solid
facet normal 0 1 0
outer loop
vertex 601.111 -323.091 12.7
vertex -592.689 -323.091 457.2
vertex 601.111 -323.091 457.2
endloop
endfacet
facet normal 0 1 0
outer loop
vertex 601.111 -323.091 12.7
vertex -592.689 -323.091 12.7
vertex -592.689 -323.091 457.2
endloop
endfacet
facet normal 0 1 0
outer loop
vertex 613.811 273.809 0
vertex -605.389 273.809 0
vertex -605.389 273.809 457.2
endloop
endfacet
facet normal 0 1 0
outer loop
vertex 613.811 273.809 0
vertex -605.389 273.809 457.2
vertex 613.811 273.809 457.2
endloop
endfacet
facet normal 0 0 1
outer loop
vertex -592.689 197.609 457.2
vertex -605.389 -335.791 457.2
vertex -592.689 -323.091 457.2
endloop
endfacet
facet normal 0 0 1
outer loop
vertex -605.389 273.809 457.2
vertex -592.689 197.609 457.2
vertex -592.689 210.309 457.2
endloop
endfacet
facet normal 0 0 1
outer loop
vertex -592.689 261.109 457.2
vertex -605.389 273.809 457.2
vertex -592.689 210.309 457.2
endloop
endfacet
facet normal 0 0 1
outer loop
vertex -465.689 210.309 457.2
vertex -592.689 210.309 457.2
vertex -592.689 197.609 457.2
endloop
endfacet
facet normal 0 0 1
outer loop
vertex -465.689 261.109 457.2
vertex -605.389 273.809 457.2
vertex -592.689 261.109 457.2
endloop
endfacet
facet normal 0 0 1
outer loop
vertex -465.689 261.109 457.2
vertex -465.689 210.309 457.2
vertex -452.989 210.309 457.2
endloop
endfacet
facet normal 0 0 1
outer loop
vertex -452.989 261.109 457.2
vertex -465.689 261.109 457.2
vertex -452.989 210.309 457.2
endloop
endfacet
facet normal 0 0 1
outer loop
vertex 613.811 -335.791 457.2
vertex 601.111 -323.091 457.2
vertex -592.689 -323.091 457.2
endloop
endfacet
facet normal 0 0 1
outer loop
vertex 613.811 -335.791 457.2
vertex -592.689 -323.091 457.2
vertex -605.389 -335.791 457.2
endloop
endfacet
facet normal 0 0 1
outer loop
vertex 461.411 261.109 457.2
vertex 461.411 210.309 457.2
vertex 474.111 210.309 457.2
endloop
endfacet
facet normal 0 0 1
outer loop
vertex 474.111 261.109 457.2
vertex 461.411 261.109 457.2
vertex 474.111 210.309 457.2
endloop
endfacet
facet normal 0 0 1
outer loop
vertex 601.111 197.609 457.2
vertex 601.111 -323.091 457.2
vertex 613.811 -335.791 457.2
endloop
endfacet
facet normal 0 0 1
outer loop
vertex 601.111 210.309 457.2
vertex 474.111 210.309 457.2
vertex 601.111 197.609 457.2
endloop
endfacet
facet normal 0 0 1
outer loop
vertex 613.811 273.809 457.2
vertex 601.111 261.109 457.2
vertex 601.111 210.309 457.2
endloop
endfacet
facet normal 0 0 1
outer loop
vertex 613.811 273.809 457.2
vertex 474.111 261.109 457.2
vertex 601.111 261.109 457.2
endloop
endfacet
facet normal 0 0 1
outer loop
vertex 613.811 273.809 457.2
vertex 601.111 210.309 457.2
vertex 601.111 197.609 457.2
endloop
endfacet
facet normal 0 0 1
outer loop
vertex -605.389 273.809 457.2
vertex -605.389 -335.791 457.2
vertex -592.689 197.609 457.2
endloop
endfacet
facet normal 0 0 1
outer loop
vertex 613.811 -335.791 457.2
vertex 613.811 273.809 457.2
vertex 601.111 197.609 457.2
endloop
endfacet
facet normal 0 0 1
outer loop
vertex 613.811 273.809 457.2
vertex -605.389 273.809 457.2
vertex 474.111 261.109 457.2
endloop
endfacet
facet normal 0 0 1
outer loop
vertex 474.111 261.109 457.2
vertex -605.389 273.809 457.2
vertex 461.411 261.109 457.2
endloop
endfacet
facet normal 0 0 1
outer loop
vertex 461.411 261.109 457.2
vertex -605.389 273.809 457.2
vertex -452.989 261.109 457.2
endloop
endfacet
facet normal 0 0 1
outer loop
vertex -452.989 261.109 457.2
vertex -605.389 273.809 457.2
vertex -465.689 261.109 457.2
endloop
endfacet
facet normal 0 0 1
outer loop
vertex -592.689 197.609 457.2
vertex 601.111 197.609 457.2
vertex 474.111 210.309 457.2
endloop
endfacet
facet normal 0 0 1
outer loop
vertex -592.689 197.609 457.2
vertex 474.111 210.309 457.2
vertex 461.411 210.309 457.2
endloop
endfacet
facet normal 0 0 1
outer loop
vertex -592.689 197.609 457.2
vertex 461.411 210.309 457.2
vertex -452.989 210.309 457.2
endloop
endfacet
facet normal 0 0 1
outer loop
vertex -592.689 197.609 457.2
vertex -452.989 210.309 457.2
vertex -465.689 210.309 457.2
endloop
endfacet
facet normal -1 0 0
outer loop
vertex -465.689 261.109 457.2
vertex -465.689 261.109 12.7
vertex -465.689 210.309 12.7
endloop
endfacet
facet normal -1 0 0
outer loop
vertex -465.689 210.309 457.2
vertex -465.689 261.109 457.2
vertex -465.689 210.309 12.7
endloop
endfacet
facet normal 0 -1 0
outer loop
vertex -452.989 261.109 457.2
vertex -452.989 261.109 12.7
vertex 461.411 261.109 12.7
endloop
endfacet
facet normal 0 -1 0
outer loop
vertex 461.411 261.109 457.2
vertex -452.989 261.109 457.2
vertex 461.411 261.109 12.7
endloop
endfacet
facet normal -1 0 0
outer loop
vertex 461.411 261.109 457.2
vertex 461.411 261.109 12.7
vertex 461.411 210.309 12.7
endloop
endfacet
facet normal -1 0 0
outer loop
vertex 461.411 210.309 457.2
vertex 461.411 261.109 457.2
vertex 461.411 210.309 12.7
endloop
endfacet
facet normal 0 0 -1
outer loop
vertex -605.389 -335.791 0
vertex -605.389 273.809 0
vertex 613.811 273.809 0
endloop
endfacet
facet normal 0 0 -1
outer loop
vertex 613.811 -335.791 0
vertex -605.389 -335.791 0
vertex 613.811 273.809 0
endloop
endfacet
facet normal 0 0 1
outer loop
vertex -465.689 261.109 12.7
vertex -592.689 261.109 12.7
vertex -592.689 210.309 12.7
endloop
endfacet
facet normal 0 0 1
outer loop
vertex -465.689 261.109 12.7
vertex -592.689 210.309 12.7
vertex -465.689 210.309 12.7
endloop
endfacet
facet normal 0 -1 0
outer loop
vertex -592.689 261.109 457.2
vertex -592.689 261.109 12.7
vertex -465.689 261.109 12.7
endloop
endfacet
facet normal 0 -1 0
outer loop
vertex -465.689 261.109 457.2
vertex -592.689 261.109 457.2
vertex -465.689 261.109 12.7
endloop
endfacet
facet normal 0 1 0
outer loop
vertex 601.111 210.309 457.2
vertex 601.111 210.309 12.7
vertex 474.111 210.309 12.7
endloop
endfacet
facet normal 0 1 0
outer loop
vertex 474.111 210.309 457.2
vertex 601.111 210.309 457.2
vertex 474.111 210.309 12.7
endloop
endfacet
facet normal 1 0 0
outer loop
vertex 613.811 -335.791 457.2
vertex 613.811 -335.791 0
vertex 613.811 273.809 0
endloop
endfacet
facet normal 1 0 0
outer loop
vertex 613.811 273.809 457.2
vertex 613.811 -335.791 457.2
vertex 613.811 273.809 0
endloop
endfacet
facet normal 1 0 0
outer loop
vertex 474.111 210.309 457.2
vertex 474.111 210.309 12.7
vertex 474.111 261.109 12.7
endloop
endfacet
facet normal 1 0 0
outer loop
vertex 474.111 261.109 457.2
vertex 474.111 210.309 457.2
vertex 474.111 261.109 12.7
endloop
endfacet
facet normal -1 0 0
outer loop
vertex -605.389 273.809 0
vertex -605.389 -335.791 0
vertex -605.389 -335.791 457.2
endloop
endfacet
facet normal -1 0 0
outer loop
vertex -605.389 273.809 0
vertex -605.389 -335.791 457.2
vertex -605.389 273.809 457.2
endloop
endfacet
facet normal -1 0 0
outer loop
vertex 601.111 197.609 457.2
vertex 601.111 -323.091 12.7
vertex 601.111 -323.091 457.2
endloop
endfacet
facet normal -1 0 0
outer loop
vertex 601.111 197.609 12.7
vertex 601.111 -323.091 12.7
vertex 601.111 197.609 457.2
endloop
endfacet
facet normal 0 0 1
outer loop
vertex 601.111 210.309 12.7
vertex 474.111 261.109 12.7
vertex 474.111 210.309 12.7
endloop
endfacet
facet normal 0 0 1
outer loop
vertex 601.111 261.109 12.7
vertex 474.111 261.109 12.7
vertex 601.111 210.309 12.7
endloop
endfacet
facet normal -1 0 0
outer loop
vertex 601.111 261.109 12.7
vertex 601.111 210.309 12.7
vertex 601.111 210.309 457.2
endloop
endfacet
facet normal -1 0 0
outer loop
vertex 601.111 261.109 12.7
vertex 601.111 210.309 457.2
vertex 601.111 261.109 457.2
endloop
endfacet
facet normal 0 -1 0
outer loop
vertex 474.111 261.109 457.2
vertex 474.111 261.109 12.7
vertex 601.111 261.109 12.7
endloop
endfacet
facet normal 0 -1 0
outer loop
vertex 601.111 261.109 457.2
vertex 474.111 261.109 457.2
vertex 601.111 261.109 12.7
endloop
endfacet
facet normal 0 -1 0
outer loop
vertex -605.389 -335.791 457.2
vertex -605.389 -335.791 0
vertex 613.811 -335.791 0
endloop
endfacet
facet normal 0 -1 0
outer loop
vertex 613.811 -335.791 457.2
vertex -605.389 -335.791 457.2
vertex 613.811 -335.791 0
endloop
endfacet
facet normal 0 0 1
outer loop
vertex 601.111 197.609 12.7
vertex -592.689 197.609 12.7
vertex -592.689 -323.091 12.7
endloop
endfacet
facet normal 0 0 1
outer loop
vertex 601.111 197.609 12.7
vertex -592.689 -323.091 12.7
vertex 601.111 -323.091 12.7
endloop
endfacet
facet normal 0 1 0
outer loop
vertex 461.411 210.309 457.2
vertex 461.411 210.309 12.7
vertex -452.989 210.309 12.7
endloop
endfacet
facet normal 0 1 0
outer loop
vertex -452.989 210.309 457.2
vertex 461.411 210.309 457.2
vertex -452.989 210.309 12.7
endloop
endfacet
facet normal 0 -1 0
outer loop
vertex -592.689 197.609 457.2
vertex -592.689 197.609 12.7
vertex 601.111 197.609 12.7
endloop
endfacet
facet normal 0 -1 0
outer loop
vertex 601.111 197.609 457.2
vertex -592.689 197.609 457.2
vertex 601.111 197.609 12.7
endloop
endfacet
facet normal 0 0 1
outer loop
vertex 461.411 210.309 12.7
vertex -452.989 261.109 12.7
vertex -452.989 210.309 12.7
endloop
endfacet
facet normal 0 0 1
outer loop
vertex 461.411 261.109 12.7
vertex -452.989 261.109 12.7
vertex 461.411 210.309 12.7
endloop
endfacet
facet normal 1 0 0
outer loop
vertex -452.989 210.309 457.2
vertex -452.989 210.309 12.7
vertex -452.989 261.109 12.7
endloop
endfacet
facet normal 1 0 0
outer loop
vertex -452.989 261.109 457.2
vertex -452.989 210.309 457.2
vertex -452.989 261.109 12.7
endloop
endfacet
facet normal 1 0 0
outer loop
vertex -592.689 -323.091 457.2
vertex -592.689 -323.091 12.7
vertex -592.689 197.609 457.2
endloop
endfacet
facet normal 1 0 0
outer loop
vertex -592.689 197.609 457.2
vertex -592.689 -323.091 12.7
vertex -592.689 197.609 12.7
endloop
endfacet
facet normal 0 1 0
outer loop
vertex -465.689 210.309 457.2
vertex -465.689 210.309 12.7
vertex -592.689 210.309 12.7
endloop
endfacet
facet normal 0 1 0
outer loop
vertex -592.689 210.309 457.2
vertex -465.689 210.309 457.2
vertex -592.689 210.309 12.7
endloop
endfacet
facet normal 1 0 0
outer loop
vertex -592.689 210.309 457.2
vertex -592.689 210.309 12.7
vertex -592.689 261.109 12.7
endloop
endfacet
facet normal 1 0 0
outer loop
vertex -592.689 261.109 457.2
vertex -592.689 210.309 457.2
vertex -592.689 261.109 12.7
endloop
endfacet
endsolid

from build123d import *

# Parameters (mm, degrees)
F0_W     = 1219.2
F0_H     = 609.6
F1_DEPTH = 457.2
F2_T     = -12.7
F4_DEPTH = 444.5


with BuildPart() as f1:
    # F0 (on Top) → F1 (new body)
    with BuildSketch(Plane.XY):
        with Locations((4.2110532522, -30.9912272245)):
            Rectangle(F0_W, F0_H)
    extrude(amount=F1_DEPTH)

    # F2
    f2_openings = [f1.faces().sort_by_distance(p)[0] for p in [
        (4.211053, -30.991227, 457.2),
    ]]
    offset(amount=F2_T, openings=f2_openings)

    # F3 (on face) → F4 (join, through all)
    with BuildSketch(Plane.XY.offset(12.7)):
        Polygon((-465.6889467478, 210.3087727755), (-592.6889467478, 210.3087727755), (-592.6889467478, 197.6087727755), (601.1110532522, 197.6087727755), (601.1110532522, 210.3087727755), (474.1110532522, 210.3087727755), (474.1110532522, 261.1087727755), (461.4110532522, 261.1087727755), (461.4110532522, 210.3087727755), (-452.9889467478, 210.3087727755), (-452.9889467478, 261.1087727755), (-465.6889467478, 261.1087727755), align=None)
    extrude(amount=F4_DEPTH)


solid = f1.part
